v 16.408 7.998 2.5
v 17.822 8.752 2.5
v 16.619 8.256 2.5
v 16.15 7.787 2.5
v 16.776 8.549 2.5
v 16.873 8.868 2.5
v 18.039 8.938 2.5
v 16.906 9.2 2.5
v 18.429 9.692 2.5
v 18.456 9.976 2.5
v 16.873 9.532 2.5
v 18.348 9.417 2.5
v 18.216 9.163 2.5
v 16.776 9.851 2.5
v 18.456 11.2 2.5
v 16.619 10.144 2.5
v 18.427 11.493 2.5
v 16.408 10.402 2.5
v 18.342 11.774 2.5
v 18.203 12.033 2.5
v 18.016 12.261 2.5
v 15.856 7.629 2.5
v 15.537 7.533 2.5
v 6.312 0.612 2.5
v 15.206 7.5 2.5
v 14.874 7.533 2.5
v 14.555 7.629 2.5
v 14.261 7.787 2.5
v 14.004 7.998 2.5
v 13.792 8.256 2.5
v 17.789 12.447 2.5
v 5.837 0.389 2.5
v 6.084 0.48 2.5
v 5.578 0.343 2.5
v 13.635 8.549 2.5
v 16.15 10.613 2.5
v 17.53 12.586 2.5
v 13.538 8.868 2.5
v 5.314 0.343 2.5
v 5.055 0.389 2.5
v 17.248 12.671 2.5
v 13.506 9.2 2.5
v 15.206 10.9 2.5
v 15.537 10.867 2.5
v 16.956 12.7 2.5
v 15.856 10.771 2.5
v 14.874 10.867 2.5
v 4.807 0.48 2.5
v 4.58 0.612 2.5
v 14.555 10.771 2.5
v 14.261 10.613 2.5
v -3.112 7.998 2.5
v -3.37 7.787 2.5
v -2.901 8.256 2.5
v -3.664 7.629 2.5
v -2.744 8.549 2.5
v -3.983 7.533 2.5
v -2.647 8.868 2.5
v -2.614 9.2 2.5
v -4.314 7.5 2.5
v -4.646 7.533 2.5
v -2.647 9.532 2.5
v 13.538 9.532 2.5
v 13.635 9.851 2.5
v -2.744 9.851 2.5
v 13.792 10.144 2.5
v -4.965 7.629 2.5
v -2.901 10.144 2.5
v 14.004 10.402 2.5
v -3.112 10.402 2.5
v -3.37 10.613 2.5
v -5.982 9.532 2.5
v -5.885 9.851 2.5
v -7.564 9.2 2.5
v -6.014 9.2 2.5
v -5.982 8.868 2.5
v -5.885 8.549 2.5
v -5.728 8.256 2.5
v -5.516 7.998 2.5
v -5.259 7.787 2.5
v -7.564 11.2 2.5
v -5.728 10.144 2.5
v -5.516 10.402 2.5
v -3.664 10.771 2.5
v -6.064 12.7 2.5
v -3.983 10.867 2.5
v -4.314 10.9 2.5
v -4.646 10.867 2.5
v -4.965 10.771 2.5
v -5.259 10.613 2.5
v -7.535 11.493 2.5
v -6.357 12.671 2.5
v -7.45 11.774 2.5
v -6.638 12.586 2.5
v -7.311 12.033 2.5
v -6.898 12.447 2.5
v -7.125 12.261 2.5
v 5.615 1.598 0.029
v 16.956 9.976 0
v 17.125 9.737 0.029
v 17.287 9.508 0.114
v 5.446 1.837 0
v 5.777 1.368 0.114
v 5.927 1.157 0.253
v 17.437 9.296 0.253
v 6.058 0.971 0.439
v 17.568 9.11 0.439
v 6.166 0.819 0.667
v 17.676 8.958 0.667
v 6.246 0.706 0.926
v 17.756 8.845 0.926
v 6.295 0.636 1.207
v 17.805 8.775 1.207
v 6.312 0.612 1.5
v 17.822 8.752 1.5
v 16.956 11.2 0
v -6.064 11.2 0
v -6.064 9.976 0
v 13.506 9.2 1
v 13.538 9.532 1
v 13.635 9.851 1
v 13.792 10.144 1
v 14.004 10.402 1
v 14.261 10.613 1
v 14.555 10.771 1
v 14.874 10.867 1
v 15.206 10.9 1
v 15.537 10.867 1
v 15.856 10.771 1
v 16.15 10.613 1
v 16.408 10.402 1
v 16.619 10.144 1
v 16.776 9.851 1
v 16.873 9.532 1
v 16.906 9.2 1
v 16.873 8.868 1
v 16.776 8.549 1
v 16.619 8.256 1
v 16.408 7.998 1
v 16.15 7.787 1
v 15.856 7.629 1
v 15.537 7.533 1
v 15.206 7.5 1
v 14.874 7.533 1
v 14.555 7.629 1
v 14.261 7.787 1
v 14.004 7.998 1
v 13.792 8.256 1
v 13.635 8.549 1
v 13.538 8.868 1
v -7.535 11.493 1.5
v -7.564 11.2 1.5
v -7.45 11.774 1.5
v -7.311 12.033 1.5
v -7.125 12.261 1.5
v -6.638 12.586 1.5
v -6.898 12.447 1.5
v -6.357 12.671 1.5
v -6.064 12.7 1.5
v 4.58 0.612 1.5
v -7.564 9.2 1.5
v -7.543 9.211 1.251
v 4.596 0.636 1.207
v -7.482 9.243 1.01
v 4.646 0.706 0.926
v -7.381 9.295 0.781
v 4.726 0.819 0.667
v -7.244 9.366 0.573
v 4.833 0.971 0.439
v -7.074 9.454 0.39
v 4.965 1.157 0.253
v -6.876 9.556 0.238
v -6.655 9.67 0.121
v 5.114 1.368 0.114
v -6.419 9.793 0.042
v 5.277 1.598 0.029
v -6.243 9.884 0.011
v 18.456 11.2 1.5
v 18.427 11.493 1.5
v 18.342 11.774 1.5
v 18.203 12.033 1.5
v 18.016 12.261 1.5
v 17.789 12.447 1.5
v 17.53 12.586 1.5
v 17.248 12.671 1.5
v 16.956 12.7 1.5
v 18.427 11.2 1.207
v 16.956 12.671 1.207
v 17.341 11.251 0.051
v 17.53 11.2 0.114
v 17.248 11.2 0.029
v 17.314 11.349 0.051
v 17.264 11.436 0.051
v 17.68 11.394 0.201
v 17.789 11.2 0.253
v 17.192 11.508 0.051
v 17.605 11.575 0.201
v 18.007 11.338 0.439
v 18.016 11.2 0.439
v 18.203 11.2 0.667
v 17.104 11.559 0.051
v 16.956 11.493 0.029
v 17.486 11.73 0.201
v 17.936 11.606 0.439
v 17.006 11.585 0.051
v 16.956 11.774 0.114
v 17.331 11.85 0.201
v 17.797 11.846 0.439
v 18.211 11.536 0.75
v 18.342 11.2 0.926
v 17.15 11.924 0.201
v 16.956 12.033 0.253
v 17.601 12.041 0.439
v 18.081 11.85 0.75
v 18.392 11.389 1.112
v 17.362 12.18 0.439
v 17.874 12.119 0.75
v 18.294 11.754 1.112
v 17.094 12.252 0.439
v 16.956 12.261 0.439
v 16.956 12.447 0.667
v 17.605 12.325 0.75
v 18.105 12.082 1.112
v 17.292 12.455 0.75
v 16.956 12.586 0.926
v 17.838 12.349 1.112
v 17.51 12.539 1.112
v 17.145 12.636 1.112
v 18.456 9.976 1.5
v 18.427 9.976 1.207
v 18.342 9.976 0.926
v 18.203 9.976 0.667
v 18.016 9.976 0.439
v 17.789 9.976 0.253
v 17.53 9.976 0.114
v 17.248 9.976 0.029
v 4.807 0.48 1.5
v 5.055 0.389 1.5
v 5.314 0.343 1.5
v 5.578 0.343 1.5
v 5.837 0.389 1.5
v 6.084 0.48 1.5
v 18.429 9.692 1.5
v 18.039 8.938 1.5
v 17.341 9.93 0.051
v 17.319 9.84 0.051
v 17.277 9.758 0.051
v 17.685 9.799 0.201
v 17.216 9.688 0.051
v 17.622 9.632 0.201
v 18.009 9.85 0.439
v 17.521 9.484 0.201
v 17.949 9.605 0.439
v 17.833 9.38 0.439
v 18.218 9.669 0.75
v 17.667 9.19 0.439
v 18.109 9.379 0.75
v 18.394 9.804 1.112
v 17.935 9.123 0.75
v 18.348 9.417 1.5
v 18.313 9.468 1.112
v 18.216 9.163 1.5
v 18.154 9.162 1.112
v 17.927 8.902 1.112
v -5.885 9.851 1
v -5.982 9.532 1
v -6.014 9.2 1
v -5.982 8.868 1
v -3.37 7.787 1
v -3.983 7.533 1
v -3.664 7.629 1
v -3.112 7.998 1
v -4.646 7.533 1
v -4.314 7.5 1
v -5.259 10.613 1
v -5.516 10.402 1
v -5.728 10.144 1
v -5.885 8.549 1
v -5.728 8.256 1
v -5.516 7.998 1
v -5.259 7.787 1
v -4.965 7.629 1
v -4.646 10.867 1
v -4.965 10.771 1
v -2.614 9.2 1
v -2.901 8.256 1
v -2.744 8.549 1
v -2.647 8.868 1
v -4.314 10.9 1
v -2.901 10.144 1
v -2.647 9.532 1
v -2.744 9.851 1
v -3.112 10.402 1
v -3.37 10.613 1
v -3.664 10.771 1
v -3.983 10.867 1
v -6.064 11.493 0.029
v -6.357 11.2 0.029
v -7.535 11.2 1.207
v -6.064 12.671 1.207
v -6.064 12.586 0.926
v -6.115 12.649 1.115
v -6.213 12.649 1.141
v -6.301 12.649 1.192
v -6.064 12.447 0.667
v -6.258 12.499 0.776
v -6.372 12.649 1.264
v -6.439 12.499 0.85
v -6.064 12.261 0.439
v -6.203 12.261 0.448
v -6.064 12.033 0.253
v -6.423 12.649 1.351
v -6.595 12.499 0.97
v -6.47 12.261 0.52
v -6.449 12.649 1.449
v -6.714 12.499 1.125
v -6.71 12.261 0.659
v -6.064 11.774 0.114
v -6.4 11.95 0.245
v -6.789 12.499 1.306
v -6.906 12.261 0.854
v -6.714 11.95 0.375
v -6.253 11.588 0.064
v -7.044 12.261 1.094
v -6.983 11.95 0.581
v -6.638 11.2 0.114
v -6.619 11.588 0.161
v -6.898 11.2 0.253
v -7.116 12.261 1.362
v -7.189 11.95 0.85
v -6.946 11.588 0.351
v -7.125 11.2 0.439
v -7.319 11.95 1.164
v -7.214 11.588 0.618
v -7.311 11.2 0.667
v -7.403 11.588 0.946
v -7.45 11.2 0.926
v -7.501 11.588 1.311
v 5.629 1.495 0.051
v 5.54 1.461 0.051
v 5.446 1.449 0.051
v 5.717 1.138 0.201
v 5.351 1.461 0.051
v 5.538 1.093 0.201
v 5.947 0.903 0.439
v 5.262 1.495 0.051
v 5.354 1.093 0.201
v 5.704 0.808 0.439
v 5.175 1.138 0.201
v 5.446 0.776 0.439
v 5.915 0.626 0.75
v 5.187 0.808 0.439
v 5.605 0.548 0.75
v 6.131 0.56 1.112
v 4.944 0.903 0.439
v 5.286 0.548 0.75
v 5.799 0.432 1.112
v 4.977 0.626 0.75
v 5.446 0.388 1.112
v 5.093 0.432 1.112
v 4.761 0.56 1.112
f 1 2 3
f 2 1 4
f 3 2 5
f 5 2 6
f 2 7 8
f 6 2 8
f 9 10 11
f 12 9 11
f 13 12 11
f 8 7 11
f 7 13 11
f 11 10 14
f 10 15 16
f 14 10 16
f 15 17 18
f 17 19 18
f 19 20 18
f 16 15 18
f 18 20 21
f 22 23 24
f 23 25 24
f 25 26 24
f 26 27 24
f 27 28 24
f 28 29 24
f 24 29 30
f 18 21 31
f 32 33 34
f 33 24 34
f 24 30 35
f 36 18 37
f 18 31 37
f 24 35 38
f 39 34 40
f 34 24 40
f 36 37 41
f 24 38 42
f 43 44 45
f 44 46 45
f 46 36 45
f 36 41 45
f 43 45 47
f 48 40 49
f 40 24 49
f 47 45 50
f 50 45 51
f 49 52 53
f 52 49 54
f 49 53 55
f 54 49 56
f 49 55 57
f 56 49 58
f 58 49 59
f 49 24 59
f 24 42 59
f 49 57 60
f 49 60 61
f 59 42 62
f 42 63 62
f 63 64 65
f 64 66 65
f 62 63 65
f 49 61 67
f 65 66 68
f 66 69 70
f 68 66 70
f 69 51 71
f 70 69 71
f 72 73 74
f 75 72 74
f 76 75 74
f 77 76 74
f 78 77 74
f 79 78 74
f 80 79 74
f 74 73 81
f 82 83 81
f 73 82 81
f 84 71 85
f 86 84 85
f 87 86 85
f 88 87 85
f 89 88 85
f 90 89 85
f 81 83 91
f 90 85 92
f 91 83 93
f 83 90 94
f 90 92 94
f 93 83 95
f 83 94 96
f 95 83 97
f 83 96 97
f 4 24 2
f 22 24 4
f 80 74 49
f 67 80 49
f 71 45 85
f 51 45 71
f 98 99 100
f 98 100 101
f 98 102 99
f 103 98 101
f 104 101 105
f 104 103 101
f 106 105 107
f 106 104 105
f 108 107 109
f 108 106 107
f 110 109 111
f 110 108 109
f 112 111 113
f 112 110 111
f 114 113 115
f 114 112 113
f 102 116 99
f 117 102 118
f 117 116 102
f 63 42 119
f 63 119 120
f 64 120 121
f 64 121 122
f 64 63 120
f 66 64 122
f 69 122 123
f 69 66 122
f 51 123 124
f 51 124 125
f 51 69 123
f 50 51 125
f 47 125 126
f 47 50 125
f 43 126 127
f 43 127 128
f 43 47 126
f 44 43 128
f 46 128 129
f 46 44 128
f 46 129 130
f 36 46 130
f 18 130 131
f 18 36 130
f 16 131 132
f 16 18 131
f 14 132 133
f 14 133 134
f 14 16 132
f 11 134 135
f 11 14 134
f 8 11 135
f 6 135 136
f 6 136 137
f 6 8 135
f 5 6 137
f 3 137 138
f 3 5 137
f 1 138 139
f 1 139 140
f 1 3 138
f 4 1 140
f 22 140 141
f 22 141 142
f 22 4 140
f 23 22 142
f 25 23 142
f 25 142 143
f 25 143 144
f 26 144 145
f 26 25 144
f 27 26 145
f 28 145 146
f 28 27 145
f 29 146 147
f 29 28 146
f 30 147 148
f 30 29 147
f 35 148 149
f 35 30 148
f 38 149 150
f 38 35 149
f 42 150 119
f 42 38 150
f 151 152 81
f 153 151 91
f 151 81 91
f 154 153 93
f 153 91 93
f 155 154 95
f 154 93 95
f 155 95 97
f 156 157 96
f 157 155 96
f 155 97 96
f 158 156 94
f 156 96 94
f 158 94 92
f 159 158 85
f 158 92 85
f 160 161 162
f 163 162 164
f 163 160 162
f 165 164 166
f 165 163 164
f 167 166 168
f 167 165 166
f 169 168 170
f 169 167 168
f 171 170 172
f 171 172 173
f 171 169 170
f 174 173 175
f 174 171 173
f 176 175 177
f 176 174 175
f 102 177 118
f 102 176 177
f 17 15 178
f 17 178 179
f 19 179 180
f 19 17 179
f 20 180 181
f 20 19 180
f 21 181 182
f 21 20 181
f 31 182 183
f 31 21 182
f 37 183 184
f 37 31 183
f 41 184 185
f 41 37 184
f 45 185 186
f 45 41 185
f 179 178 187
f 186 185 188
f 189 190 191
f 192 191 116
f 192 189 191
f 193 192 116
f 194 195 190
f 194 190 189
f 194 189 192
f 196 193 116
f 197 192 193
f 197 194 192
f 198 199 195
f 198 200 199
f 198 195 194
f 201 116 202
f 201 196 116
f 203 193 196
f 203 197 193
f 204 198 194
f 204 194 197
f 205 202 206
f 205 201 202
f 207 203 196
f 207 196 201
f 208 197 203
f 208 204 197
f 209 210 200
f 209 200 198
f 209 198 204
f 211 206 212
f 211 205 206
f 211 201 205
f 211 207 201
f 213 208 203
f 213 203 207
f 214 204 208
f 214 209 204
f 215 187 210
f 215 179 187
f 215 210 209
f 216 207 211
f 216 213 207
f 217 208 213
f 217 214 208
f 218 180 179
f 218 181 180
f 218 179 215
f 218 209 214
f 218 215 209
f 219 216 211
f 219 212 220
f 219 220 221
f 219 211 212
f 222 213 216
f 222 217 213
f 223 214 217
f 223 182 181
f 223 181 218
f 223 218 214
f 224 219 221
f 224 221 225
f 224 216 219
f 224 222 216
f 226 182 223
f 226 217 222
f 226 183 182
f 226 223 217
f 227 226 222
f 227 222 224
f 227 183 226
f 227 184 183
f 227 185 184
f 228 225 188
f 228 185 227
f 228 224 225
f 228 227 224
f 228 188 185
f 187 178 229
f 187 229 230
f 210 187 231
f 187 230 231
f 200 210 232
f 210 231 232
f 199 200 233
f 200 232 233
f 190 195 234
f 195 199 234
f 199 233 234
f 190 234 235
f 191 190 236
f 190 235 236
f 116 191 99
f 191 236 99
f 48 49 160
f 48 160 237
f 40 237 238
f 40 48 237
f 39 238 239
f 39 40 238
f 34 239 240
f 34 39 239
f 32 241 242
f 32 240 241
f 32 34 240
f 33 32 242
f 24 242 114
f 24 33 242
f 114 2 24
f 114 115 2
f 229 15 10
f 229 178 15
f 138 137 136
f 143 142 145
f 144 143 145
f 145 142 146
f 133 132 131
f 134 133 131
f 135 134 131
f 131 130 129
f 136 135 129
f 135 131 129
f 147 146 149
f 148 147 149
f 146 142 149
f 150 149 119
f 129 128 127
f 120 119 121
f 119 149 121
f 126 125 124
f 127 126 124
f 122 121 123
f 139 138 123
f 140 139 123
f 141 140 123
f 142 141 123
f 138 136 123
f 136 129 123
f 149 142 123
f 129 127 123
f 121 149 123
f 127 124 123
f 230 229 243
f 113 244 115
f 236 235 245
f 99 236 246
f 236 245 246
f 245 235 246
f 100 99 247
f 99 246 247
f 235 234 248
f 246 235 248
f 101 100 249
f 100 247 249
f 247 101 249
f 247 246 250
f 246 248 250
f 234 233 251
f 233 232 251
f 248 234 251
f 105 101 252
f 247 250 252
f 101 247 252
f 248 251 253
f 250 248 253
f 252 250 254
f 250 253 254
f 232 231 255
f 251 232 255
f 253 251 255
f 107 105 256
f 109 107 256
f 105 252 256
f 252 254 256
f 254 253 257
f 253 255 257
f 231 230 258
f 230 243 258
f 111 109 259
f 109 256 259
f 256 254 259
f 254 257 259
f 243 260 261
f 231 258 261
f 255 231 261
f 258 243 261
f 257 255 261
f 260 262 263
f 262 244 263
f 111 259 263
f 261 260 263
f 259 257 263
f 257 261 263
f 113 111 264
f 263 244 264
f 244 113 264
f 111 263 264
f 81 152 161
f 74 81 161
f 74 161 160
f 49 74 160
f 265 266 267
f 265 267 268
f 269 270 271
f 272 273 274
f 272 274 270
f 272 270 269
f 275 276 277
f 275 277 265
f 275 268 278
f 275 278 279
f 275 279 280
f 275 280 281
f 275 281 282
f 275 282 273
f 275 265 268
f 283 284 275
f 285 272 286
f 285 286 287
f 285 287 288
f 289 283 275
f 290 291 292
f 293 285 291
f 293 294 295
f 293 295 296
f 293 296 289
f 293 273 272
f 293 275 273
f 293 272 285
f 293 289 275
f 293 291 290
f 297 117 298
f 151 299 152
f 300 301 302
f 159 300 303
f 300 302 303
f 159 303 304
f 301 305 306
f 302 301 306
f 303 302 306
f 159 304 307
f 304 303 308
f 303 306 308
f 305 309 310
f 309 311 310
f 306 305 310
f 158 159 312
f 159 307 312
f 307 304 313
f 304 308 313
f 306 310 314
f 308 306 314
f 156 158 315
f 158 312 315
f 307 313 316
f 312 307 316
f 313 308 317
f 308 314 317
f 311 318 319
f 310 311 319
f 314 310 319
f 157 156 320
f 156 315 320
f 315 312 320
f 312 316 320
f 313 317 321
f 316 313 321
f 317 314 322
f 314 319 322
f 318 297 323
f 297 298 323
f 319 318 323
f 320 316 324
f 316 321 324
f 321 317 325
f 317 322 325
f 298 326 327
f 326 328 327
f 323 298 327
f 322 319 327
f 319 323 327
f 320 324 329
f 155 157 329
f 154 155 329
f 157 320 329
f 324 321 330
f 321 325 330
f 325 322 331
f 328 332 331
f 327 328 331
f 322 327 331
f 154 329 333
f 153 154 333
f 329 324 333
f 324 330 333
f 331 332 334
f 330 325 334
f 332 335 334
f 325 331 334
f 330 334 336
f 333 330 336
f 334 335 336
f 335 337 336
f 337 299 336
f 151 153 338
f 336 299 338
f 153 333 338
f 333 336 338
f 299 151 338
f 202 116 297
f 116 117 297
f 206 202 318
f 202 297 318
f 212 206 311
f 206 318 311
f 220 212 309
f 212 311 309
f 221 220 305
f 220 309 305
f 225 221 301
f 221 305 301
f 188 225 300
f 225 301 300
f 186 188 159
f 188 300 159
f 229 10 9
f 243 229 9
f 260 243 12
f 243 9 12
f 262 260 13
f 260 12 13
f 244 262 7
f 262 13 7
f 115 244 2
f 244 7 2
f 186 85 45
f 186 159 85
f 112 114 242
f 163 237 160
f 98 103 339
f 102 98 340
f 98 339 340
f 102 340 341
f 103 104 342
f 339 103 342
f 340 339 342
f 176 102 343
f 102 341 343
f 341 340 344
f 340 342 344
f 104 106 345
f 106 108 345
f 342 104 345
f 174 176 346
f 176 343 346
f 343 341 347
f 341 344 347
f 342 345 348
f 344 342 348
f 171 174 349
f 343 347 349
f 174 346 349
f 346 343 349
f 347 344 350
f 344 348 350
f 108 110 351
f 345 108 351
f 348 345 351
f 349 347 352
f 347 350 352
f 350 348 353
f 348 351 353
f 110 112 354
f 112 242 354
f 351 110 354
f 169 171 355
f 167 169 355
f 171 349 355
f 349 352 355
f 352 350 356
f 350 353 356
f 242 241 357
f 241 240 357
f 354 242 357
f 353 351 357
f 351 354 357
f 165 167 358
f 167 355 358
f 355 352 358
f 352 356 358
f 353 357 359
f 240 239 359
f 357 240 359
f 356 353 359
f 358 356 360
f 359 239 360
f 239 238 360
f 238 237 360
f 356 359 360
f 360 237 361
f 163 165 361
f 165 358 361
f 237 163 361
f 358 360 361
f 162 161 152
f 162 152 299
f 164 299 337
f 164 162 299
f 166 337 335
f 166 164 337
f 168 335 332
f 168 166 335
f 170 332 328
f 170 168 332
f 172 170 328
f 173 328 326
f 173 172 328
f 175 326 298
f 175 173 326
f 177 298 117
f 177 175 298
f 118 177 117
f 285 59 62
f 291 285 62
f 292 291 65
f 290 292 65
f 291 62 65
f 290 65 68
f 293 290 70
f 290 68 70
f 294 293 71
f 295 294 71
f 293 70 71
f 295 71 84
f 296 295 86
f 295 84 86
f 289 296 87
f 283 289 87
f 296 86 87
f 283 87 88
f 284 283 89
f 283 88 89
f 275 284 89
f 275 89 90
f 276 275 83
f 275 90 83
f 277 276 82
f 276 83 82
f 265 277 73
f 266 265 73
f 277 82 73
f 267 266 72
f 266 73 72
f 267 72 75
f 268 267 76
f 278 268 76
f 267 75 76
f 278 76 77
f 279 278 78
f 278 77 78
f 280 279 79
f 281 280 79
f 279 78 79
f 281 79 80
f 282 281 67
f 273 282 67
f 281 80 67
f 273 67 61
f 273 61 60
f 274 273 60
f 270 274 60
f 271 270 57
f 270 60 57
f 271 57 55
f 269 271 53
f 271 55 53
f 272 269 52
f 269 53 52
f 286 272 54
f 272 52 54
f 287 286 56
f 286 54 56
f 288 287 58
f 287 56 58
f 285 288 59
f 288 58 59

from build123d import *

# Parameters (mm, degrees)
BOSS_EXTRUDE1_DEPTH = 2.5
SKETCH2_R           = 1.7
CUT_EXTRUDE1_DEPTH  = 1.5
FILLET1_R           = 1.5


with BuildPart() as part:
    # Sketch1 → Boss-Extrude1 (new body)
    with BuildSketch(Plane.XY):
        Polygon((-7.56419618, 12.7), (-7.56419618, 9.2), (5.44580382, 0), (5.44580382, 12.7), align=None)
    extrude(amount=BOSS_EXTRUDE1_DEPTH)

    # Sketch2 → Cut-Extrude1 (cut)
    with BuildSketch(Plane.XY.offset(2.5)):
        with Locations((-4.31419618, 9.2)):
            Circle(SKETCH2_R)
    extrude(amount=-CUT_EXTRUDE1_DEPTH, mode=Mode.SUBTRACT)

    # Mirror2: part across plane


with BuildPart() as part_1:
    add(part.part)
    add(part.part.mirror(Plane(origin=(5.44580382, 0, 2.5), x_dir=(0, 0, 1), z_dir=(-1, 0, 0))))

    # Fillet1
    fillet1_edges = [part_1.edges().sort_by_distance(p)[0] for p in [
        (18.45580382, 12.7, 1.25),
        (18.45580382, 9.2, 1.25),
        (5.44580382, 0, 1.25),
        (18.45580382, 10.95, 0),
        (11.95080382, 4.6, 0),
        (-1.05919618, 4.6, 0),
        (-7.56419618, 10.95, 0),
        (5.44580382, 12.7, 0),
        (-7.56419618, 12.7, 1.25),
    ]]
    fillet(fillet1_edges, radius=FILLET1_R)


solid = part_1.part
